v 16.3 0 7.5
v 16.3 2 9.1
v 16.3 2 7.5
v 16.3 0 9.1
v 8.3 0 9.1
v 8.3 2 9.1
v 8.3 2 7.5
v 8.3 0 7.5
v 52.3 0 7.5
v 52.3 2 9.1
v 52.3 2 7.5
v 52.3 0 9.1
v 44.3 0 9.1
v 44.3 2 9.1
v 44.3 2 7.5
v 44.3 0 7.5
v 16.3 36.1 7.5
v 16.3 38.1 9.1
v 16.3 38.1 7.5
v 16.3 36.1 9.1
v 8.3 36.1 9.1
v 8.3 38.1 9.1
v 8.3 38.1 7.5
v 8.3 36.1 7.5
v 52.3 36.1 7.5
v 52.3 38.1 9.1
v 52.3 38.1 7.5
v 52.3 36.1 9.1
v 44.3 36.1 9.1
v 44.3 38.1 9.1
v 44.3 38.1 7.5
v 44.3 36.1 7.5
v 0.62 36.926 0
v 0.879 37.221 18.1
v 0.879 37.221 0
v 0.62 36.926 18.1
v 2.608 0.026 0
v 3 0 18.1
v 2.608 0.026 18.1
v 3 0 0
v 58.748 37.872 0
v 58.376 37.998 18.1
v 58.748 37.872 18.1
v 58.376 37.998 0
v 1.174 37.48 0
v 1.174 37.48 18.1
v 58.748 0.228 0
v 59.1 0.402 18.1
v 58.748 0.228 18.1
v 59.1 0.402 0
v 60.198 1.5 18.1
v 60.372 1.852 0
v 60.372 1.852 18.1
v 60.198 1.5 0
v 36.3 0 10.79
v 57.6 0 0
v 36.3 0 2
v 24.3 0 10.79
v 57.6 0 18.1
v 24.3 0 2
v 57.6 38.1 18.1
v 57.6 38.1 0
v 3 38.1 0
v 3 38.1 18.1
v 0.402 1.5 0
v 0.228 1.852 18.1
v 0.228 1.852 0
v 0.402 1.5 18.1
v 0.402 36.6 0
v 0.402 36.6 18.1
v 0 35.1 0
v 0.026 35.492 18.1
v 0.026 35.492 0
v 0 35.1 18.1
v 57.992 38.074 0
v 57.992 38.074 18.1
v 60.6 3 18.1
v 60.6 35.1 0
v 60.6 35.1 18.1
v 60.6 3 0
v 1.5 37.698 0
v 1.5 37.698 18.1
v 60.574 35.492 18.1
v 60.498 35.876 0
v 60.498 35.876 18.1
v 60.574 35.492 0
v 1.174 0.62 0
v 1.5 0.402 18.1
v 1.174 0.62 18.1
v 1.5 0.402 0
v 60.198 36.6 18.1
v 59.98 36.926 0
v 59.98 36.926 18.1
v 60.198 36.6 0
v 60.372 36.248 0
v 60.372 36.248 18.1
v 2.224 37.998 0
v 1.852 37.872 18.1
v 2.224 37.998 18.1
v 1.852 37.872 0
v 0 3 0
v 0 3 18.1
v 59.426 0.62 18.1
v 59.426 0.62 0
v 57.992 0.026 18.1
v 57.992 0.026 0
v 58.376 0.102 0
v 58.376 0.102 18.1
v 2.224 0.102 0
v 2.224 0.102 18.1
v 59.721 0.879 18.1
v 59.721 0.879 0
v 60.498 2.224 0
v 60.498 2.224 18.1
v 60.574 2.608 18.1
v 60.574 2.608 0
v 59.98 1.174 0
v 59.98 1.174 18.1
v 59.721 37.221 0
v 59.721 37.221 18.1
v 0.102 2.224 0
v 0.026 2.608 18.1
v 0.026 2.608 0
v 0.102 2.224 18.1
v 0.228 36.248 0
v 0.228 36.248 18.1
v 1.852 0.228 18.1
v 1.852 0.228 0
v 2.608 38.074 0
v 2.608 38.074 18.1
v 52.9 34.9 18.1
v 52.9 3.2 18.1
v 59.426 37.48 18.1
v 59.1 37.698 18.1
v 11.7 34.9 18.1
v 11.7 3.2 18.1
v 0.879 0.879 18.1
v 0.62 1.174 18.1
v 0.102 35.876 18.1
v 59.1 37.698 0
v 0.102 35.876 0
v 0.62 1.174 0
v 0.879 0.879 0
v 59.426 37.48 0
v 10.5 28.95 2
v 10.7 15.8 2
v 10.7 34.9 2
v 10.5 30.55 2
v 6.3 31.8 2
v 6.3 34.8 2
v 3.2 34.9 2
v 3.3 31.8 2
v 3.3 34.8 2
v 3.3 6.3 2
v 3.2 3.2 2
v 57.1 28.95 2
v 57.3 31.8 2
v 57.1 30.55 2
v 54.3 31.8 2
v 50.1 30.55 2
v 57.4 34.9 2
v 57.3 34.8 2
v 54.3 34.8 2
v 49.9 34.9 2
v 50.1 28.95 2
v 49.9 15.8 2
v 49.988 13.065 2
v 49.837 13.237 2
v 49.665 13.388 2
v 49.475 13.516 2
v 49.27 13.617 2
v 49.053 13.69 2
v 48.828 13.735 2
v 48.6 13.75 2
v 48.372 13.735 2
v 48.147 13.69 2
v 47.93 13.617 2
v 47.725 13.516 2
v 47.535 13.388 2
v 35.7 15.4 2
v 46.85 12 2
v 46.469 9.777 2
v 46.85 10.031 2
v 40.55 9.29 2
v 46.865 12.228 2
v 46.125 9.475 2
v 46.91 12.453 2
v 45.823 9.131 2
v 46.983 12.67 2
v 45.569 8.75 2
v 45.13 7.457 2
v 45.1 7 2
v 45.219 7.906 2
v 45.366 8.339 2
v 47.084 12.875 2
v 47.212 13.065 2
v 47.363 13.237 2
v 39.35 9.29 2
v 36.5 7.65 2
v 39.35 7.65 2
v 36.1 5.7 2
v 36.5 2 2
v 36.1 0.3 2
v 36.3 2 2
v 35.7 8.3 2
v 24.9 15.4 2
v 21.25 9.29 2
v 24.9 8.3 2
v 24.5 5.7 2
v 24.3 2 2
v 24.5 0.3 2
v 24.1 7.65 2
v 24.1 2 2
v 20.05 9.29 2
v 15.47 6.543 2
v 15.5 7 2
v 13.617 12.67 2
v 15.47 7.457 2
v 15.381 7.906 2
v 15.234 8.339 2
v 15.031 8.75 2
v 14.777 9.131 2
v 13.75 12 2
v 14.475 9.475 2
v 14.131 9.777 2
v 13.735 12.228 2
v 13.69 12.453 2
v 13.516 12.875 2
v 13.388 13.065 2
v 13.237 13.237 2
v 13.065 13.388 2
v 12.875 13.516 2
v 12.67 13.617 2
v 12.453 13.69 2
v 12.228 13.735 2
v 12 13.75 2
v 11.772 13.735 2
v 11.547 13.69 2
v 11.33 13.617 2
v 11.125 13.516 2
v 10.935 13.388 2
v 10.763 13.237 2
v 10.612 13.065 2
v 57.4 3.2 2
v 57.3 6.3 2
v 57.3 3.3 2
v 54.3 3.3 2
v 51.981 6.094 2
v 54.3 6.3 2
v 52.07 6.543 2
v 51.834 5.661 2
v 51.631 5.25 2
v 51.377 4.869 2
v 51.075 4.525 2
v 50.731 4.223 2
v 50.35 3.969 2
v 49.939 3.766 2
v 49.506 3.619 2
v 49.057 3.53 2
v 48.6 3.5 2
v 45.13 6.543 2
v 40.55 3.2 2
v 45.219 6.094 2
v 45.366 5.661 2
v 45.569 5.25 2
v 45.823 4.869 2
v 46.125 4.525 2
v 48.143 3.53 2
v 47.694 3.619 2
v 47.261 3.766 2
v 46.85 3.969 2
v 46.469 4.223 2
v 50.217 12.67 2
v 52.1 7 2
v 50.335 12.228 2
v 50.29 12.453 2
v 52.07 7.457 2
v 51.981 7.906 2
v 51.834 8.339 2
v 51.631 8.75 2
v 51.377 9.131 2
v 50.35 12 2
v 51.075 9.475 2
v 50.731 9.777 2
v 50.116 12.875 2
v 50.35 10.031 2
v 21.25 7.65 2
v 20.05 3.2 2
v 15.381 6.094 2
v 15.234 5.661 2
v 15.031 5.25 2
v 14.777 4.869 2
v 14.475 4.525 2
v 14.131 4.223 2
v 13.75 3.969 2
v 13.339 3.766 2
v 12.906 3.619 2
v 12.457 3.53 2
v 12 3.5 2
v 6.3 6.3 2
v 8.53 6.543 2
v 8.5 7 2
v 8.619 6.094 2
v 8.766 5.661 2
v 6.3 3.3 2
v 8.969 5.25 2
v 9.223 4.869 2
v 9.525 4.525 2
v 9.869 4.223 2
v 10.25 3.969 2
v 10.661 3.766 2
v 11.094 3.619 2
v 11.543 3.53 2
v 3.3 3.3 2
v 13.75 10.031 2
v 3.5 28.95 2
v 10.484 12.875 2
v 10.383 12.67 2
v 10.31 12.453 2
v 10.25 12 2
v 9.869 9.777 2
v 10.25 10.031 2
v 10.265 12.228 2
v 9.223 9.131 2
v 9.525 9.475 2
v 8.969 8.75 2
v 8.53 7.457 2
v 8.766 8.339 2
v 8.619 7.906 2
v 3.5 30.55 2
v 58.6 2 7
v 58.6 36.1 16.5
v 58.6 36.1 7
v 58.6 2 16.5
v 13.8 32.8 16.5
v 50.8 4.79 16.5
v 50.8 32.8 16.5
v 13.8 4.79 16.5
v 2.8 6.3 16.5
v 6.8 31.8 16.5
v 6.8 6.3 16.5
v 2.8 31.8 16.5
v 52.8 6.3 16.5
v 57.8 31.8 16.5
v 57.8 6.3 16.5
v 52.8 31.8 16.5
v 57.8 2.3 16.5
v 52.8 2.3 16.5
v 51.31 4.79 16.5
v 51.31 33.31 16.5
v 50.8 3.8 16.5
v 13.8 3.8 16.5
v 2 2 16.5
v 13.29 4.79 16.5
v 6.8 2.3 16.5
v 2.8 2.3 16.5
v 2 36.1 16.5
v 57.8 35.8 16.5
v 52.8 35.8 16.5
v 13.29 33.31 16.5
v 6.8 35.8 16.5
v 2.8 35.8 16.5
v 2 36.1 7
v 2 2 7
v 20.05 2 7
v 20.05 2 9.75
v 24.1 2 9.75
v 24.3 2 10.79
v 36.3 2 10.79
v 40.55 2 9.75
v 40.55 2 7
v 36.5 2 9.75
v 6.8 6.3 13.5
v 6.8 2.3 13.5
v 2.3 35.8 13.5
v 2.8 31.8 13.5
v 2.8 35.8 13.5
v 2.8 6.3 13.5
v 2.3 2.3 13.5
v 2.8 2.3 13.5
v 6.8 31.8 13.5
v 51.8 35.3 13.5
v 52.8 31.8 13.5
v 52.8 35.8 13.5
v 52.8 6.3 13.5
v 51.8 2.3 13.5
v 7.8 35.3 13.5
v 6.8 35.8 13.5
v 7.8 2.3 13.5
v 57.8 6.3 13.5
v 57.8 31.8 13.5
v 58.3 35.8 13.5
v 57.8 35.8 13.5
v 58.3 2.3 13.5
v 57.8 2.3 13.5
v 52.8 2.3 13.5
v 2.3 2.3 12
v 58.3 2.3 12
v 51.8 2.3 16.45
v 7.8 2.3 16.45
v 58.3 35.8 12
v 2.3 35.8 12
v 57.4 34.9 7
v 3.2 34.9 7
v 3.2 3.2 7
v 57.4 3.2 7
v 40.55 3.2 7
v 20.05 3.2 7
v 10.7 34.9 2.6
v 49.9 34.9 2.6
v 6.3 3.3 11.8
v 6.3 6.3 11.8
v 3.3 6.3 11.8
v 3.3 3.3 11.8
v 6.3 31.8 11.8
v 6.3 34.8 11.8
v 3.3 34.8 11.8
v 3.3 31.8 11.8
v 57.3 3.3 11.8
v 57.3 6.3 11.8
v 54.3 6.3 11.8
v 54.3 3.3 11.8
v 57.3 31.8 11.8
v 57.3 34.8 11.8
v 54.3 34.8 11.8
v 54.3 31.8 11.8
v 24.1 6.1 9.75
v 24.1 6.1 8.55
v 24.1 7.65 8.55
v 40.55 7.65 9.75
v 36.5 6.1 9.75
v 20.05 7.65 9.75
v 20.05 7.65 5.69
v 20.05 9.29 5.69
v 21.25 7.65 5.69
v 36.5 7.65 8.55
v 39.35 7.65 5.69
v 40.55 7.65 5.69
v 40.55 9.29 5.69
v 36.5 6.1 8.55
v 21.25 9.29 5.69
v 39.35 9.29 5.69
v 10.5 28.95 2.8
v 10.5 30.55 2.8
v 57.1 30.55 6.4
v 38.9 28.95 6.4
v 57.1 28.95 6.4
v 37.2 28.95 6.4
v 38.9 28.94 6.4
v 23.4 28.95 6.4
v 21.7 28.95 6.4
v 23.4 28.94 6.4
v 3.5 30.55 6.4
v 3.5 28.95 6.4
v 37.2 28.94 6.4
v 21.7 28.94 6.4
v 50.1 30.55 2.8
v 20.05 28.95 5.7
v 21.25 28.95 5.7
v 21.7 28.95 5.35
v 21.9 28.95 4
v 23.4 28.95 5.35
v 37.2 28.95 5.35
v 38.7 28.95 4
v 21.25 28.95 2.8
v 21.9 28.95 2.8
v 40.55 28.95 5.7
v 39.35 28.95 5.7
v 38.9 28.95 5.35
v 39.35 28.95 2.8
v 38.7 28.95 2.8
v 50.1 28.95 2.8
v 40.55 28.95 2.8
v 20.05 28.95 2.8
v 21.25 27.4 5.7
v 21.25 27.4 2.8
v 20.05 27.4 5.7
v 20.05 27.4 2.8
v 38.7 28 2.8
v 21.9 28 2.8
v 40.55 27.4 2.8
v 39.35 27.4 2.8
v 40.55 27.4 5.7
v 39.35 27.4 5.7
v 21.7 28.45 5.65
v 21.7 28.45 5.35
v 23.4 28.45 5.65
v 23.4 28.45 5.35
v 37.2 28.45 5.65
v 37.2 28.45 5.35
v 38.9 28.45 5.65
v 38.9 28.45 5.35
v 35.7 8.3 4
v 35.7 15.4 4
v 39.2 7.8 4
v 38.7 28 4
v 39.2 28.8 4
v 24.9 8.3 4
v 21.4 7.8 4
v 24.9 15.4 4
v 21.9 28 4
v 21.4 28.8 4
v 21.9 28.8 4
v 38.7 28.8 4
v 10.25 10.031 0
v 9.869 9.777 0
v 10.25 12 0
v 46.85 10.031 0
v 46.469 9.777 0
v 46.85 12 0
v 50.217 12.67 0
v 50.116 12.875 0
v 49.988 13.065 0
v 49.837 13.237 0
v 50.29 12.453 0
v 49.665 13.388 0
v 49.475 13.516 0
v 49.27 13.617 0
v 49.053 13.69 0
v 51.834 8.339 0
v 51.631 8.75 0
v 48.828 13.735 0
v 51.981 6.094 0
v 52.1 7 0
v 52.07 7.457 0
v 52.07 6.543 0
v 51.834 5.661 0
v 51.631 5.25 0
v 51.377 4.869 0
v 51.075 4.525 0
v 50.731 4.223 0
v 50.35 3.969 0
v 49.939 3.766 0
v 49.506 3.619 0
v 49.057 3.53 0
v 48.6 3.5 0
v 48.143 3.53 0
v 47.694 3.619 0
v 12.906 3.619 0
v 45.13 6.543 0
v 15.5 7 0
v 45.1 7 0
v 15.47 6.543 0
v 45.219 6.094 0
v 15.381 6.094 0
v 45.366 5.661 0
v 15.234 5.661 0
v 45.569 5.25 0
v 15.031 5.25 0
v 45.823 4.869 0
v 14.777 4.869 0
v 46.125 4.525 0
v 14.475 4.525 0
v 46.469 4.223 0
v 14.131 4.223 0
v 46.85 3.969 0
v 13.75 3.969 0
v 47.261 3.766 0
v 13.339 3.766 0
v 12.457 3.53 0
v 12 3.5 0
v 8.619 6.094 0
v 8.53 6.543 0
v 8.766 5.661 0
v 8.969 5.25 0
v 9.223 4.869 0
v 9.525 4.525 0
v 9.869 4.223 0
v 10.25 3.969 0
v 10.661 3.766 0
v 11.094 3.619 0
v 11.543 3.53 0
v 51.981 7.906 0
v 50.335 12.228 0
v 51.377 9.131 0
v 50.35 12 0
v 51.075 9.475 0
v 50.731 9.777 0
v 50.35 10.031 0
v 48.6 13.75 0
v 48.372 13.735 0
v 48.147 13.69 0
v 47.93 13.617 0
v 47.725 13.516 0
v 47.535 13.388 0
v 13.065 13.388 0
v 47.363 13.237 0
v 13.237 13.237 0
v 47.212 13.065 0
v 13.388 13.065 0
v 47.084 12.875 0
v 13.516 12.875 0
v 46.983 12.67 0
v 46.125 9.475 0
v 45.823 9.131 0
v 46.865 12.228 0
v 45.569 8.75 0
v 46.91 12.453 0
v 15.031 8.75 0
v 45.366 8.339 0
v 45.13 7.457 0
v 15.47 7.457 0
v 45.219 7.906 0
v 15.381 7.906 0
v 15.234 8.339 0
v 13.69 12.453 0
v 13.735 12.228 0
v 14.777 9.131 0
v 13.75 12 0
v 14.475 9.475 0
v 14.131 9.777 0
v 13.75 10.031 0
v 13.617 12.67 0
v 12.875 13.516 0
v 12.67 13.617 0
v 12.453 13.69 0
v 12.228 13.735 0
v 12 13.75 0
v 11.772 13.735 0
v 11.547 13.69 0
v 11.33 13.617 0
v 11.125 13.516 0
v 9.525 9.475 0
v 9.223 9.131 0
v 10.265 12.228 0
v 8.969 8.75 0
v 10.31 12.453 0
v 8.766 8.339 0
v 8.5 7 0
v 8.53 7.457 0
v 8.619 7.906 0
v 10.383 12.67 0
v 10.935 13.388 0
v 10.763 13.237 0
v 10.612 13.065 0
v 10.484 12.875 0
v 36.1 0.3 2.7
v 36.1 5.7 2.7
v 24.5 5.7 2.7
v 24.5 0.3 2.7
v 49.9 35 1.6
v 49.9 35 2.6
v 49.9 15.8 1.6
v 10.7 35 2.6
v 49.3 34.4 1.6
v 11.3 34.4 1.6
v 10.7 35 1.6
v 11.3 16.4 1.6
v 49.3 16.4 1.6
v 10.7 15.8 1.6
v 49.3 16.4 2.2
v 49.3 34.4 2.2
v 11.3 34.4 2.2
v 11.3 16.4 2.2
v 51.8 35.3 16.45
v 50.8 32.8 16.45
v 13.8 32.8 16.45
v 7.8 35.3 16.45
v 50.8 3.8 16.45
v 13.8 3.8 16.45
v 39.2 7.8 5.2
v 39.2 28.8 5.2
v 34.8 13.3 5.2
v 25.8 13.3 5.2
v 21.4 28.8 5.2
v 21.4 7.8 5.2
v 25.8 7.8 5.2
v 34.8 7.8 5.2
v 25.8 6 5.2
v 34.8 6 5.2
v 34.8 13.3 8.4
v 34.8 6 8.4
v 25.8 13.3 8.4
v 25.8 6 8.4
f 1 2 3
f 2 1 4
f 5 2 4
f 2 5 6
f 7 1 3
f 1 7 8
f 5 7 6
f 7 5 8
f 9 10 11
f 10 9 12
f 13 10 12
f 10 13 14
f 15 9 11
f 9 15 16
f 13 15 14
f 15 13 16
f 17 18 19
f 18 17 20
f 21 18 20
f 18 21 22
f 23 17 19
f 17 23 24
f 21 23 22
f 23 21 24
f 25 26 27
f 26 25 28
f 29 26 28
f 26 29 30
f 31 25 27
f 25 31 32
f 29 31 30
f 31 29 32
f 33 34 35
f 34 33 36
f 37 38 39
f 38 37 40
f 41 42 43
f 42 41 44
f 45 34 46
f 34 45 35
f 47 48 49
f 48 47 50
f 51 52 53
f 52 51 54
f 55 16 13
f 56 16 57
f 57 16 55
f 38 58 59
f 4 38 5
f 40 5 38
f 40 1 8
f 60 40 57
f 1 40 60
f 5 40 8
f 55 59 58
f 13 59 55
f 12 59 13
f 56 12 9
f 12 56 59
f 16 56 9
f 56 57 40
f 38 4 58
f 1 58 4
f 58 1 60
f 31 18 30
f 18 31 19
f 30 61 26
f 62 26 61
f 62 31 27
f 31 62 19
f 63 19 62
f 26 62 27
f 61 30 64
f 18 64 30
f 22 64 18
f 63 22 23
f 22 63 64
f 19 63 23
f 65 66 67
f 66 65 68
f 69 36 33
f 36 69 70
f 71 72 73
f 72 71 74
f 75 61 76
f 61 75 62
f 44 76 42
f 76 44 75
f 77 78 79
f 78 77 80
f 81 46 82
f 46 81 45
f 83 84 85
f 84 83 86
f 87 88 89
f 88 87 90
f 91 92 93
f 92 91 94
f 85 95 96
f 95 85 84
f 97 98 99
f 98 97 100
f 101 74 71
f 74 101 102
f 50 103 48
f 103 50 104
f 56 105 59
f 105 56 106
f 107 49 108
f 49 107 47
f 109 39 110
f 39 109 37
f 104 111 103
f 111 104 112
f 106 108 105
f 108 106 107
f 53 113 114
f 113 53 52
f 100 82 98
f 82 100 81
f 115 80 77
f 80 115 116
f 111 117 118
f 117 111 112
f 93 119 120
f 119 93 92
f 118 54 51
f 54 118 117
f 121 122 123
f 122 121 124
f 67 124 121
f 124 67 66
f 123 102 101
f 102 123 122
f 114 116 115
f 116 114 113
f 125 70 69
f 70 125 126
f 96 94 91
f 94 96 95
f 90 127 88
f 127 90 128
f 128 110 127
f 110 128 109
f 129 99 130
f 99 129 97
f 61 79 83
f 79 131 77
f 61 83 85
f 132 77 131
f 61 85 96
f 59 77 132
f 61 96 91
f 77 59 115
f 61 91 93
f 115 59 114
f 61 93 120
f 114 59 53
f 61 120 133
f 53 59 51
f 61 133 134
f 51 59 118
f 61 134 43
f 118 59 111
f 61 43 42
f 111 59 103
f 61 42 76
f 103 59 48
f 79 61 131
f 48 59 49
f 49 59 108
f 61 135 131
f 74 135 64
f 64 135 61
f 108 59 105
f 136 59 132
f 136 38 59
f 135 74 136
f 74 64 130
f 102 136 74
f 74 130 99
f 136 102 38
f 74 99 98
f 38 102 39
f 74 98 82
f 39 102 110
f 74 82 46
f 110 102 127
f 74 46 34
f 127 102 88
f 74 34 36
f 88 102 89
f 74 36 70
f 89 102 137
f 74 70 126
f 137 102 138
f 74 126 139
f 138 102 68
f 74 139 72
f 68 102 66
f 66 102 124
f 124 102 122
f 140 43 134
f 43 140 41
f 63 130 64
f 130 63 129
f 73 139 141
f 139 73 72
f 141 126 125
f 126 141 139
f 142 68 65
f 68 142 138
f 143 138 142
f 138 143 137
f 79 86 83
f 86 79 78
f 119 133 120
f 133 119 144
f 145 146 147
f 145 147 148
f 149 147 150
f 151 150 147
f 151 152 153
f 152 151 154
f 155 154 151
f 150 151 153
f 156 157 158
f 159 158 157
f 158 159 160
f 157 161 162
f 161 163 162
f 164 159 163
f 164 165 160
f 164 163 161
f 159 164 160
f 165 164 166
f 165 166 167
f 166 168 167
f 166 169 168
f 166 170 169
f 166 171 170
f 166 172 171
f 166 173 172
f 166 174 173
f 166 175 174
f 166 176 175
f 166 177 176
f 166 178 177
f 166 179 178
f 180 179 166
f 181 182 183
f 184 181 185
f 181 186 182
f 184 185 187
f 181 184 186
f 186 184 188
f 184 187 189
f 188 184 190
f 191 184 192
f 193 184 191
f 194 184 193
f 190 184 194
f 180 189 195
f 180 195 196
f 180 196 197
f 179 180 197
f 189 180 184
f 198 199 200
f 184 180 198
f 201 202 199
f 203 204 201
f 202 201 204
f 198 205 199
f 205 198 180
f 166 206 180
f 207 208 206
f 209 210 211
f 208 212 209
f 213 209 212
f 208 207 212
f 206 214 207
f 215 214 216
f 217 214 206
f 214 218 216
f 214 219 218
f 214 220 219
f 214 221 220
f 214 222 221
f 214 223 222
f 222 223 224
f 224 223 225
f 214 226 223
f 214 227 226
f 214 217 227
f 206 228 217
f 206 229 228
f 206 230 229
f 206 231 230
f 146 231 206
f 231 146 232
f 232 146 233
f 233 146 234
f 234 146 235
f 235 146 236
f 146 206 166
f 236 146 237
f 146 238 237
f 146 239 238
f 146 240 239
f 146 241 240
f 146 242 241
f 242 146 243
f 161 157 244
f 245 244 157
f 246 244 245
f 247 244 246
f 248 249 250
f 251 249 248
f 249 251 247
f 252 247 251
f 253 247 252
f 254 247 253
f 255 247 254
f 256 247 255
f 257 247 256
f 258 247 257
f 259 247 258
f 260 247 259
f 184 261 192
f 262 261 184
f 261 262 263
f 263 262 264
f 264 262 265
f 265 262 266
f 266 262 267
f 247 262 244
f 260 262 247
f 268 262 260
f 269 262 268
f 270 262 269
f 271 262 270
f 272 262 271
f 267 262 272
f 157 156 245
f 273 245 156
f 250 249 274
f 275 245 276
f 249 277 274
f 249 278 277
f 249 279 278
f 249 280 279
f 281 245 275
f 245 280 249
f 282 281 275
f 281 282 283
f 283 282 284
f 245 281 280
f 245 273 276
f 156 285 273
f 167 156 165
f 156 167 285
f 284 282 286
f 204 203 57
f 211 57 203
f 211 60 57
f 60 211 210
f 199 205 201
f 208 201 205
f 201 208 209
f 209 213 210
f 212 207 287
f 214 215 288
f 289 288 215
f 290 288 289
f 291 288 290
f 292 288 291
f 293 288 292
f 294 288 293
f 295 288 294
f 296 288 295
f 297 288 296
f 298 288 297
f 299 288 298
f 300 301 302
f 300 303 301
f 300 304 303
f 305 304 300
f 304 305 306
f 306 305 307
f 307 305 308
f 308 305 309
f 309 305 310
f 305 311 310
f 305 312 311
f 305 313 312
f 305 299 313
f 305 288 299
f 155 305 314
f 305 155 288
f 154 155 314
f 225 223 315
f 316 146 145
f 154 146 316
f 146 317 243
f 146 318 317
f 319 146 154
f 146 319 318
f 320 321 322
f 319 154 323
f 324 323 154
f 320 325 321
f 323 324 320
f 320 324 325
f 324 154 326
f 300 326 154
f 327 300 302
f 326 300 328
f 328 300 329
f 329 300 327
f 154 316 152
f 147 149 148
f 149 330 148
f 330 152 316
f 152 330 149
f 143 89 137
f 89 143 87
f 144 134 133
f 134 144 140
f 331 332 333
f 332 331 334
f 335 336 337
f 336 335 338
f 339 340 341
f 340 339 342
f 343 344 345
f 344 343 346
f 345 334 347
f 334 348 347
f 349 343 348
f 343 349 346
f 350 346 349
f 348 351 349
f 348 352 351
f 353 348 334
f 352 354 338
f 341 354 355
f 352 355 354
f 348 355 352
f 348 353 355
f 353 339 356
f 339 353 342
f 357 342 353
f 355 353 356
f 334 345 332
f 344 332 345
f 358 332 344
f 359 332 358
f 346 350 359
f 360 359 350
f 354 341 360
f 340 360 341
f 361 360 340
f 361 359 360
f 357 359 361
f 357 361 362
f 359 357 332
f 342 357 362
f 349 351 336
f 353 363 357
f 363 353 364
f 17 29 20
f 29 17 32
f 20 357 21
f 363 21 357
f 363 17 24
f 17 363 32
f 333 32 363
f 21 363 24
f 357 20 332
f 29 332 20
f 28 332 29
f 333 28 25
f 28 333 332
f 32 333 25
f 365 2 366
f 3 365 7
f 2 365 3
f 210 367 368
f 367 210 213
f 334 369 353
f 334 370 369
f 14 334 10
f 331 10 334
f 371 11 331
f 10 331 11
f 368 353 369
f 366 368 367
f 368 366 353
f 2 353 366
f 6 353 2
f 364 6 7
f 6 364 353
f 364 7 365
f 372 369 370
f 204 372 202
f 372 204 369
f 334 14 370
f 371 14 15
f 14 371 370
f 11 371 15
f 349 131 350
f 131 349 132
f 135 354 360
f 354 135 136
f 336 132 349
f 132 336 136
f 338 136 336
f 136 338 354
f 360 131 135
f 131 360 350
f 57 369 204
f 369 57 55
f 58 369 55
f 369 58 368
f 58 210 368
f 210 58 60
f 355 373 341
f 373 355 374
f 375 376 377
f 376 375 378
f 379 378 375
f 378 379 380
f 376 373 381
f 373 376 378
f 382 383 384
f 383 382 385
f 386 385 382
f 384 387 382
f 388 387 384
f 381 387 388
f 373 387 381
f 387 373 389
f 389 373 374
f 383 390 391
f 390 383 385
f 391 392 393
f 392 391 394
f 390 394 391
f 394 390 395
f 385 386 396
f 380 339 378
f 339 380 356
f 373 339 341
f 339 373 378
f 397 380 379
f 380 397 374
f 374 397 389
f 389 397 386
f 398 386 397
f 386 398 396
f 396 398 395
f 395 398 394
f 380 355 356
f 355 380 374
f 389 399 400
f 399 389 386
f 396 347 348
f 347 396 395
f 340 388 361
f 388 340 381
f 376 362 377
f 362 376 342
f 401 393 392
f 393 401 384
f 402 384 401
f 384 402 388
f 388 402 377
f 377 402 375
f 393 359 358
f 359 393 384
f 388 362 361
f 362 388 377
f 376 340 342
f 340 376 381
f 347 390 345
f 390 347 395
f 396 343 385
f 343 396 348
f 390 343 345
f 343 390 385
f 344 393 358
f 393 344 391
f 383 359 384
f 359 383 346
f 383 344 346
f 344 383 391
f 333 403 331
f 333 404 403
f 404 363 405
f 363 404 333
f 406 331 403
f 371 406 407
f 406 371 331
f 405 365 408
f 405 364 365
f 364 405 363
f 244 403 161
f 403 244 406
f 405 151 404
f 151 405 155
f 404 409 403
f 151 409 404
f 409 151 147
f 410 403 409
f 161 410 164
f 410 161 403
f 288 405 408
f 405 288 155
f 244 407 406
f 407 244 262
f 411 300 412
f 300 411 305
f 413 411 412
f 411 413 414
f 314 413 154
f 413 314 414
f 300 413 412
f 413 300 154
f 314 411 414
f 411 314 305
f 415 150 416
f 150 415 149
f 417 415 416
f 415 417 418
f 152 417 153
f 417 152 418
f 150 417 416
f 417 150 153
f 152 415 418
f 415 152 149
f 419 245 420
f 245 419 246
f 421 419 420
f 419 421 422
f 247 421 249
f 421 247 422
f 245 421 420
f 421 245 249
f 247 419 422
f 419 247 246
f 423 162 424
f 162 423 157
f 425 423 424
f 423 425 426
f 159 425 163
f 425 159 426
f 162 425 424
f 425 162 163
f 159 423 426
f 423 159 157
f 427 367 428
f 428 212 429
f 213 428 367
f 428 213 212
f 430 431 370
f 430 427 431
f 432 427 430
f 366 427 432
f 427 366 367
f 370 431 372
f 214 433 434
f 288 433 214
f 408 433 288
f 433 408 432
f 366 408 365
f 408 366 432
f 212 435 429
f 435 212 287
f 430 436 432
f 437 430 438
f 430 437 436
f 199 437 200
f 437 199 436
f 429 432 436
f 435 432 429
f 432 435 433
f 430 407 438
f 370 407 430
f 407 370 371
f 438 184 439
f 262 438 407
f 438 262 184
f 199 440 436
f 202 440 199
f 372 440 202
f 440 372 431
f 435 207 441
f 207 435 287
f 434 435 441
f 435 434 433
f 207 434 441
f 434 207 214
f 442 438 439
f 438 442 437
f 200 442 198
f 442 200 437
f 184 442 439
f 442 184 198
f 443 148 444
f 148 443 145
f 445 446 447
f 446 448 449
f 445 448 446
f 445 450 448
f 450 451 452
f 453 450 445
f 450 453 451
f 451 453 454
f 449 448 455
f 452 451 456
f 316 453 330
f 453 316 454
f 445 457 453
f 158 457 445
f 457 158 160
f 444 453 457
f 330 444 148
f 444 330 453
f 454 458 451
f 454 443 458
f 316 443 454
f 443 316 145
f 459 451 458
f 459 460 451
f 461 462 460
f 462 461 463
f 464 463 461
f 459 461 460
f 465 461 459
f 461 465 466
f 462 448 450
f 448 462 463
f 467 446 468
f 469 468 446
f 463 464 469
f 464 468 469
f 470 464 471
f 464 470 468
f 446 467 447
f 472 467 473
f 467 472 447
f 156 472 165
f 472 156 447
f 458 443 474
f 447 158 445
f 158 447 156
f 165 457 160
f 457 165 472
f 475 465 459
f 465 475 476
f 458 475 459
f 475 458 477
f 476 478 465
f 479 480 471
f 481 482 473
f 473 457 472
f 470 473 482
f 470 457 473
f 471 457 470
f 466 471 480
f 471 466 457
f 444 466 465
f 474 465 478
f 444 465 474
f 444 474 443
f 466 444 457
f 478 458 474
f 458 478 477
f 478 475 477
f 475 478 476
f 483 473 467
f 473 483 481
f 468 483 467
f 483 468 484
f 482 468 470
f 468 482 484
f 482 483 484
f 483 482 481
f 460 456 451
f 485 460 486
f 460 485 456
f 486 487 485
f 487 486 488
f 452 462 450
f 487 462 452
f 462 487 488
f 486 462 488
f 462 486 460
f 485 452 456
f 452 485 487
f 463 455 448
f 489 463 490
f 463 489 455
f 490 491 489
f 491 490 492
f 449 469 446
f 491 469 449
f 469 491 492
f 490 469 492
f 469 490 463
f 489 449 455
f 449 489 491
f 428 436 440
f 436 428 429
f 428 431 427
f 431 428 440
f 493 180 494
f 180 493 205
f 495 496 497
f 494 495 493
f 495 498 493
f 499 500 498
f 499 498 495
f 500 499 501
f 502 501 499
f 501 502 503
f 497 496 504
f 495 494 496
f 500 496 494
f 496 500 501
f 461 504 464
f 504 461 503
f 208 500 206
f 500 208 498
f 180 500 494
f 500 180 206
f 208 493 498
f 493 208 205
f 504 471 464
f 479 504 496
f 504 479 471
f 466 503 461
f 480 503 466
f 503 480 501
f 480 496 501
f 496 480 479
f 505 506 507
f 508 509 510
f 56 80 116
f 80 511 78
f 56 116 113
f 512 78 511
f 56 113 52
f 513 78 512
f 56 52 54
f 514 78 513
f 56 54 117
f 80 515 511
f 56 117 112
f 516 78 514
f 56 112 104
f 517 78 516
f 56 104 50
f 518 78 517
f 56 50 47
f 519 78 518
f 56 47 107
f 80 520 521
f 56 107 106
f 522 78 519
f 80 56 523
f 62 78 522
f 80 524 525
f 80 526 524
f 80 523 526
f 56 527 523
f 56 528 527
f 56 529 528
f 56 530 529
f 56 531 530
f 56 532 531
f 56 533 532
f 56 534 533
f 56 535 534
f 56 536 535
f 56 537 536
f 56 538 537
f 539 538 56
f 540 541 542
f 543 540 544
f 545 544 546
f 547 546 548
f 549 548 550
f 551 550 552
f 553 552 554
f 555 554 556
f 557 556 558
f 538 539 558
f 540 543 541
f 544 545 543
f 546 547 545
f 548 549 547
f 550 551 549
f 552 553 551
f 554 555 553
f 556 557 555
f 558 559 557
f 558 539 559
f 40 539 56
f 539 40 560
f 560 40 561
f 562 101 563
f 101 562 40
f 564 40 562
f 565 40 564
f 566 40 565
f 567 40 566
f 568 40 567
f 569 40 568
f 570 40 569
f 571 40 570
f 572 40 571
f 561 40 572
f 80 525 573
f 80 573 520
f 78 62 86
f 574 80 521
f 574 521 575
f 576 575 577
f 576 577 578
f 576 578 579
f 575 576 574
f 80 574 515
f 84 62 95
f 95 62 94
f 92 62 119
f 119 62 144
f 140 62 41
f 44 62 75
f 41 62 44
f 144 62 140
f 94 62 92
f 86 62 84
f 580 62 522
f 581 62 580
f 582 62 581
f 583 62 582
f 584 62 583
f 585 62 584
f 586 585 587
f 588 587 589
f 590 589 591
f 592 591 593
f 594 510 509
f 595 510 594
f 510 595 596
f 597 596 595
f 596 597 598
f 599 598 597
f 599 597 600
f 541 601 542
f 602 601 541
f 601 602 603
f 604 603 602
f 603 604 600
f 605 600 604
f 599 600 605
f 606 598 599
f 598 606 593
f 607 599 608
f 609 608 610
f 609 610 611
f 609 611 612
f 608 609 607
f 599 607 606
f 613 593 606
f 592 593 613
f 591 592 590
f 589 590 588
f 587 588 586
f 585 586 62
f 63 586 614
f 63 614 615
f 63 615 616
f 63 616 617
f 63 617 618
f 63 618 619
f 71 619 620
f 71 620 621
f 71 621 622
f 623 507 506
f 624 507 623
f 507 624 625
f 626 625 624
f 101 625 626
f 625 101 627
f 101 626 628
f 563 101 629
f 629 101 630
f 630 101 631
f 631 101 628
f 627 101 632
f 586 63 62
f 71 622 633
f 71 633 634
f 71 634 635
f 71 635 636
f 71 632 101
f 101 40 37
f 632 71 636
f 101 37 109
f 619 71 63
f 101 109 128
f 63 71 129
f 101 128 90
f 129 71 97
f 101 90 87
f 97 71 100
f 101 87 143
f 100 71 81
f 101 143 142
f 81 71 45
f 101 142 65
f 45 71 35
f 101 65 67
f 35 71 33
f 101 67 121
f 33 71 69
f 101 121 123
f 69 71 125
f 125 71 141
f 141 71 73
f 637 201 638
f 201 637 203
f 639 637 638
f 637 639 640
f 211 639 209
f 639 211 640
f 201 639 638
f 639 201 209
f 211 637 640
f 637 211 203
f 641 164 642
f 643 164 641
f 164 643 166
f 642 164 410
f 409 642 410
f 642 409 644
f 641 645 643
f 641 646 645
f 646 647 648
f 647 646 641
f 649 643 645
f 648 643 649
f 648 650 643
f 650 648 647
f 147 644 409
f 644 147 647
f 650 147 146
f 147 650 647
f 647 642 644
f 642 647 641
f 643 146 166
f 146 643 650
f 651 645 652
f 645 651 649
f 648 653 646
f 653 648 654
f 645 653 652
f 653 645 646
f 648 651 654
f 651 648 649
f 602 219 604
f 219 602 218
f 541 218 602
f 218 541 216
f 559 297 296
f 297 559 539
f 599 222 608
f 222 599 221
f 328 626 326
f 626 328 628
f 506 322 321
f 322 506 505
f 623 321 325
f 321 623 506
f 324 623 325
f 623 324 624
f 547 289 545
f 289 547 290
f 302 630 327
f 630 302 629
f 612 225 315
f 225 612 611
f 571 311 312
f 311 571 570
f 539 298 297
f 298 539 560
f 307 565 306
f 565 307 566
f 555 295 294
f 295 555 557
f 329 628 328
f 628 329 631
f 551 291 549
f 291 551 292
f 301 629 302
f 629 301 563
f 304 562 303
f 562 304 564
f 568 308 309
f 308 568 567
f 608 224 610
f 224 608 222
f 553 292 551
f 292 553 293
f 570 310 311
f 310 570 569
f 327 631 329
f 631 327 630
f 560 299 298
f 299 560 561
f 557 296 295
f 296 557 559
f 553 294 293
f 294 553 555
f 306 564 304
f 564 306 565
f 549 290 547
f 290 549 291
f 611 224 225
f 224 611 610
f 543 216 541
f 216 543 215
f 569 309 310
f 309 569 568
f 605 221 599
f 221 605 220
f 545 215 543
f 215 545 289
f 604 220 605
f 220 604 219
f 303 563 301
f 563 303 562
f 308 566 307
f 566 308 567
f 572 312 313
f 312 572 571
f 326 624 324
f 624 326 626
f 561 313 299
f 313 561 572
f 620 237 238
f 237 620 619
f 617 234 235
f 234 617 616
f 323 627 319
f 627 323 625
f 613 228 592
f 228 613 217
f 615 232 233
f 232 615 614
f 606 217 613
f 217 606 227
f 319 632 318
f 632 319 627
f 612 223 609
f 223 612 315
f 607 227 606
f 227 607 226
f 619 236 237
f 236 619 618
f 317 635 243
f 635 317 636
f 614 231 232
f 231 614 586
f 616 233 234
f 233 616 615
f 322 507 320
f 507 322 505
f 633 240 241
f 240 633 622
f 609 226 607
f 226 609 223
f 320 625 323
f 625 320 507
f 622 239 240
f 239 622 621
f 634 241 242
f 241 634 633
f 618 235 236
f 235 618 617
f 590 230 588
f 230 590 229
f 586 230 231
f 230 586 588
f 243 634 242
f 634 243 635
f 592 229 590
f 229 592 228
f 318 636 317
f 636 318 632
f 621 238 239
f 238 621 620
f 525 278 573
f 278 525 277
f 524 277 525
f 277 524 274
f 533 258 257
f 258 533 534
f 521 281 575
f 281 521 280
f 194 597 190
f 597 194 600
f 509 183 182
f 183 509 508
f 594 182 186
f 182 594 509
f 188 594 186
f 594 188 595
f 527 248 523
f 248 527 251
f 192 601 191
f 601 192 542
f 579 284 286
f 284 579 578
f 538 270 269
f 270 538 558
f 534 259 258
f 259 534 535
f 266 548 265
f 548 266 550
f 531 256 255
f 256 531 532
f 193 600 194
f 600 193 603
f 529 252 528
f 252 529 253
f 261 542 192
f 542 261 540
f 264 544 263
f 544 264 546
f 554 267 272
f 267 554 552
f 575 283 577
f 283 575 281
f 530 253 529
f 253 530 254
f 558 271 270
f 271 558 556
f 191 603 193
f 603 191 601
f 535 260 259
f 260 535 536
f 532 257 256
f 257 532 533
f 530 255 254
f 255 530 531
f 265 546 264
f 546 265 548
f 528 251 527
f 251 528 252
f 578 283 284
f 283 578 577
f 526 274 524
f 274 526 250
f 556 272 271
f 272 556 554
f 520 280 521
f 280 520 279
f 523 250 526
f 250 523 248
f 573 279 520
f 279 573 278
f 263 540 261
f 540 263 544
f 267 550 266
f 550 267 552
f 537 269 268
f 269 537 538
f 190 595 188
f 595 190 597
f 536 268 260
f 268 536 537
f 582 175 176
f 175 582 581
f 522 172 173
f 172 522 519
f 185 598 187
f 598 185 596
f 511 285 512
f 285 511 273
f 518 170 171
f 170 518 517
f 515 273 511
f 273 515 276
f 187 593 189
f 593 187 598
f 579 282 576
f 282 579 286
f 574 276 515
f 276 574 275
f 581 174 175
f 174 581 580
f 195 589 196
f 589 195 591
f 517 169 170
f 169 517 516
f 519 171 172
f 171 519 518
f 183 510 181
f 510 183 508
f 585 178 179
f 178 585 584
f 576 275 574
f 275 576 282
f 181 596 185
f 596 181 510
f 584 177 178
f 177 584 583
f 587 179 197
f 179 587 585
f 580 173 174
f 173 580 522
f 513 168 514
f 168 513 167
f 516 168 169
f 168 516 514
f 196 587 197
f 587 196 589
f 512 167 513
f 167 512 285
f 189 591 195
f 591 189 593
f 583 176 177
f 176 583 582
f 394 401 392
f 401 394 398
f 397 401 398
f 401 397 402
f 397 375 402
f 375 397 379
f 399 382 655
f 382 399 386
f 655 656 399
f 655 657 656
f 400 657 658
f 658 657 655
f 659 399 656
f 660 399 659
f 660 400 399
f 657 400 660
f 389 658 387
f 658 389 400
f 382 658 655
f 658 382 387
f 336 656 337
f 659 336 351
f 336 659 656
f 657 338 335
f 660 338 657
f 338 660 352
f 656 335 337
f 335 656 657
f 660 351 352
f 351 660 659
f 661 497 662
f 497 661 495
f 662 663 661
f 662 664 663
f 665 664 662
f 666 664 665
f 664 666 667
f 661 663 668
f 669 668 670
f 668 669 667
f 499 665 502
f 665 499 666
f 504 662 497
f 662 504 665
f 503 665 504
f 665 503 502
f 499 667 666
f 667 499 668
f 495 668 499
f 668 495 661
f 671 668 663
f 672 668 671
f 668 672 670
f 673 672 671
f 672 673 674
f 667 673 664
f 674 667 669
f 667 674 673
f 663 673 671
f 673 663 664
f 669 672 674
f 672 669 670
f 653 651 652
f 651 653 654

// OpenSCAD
// =====================================================================
//  PV display – wall enclosure for 1.8" TFT (ST7735) + Seeed XIAO ESP32-S3
//  All dimensions in mm. Values marked  // MEASURE  are still estimates.
//
//  Printed parts:
//    teil = "front"      -> frame with display window (print front face down)
//    teil = "testblende" -> front plate only, quick test print for window and fit
//    teil = "deckel"     -> back lid with XIAO holder, antenna outline and keyholes (print flat)
//    teil = "halter_test"-> lower part of the lid with the XIAO holder only: quick test print
//    teil = "deckel_test"-> outer edge of the lid only (rim + crush ribs): quick fit test
//    teil = "alles" / "explodiert" -> assembly / exploded view (preview only, do not print)
//  Export: set teil, F6 (render), F7 (save STL)
// =====================================================================

teil = "alles";              // [alles, explodiert, front, deckel, testblende, halter_test, deckel_test]

/* [Display module] */
pcb_b        = 56.0;         // PCB width
pcb_h        = 33.5;         // PCB height (+0.5 after test print)
pcb_d        = 1.5;          // PCB thickness
glas_ab_links  = 5.5;        // free PCB area left of the glass (header pins are here)
glas_ab_rechts = 6.5;        // free PCB area right of the glass
glas_b       = pcb_b - glas_ab_links - glas_ab_rechts;   // = 44 mm
glas_h       = 33.0;         // glass height (same as PCB)
glas_d       = 3.0;          // glass thickness (total 4.5 minus PCB 1.5)
aktiv_b      = 37.0;         // active area width (after test print: 5 mm narrower on the left, right unchanged)
aktiv_h      = 29.0;         // active area height
aktiv_ab_links = 11.5;       // active area: distance from the left PCB edge (after test print)
aktiv_ab_oben  = 3.0;        // active area: distance from the top PCB edge

/* [XIAO ESP32-S3] */
// The XIAO clicks into a holder on the lid, component side towards the display, USB-C pointing down.
// Hook it in with the USB end first (socket under the bridge), then press the far end down until
// it snaps behind the two lips. To remove: push the rear bar outwards and lift the far end.
// Plugging in pushes the board against the rear bar, pulling the cable pulls it against the
// posts beside the socket - the snap lips only keep it from lifting.
xiao_b       = 17.8;         // PCB width
xiao_l       = 21.0;         // PCB length (without the USB socket)
xiao_pcb     = 1.2;          // PCB thickness                                              // MEASURE
xiao_unten_frei = 2.0;       // free space under the PCB (solder joints on the bottom side)  // MEASURE
usb_b        = 9.0;          // USB-C socket width
usb_h        = 3.2;          // USB-C socket height above the PCB                           // MEASURE
usb_ueberstand = 1.8;        // USB-C socket protrudes beyond the PCB edge
raste_ueberstand = 0.5;      // snap lip overlap on the PCB (larger = holds tighter, harder to snap)
steg_d       = 1.6;          // thickness of the flexible rear bar (thinner = softer snap)
halter_spiel = 0.15;         // clearance around the XIAO in the holder
xiao_nach_innen = 4.0;       // XIAO this far away from the USB wall (the plug then reaches into the enclosure)

/* [Antenna] */
ant_b        = 38.0;         // adhesive antenna width
ant_h        = 18.0;         // adhesive antenna height

/* [USB cable] */
stecker_b    = 12.0;         // opening for the plug: width (with some clearance)
stecker_h    = 8.0;          // opening for the plug: height (with some clearance)

/* [Enclosure] */
wand         = 2.0;          // wall thickness
front        = 1.6;          // front bezel thickness
deckel_d     = 2.0;          // back lid thickness
spiel        = 0.3;          // clearance around the PCBs (print tolerance)
deckel_passung = 0.0;        // clearance between lid rim and enclosure (smaller = tighter; was 0.2, then 0.05)
rand_h       = 5.0;          // height of the lid rim (was 3; max. raum_hinten - 4.8, the vents start above)
klemm_rippe  = 0.3;          // crush ribs: how far they protrude beyond the rim (0 = none)
raum_hinten  = 10.0;         // space behind the display (XIAO, antenna, screw heads)
ecken_r      = 3.0;          // outer corner radius
fenster_rand = 0.5;          // window slightly larger than the active area
rahmen_ausgleich = "fenster"; // [fenster, gehaeuse, aus]  equal frame top/bottom: shorten window at the bottom, or extend enclosure at the bottom, or off
schraube_d   = 3.5;          // wall screw shank diameter
kopf_d       = 7.0;          // wall screw head diameter

$fn = 48;

// ---------------------------------------------------------------- derived dimensions
innen_b = pcb_b + 2*spiel;
innen_h = pcb_h + 2*spiel;
aussen_b = innen_b + 2*wand;
// The active area is not centered on the PCB (more margin at the top than at the bottom).
// "gehaeuse": the bottom wall gets the difference added (enclosure gets taller)
// "fenster":  the window is shortened at the bottom by the difference (enclosure unchanged)
versatz = max(0, aktiv_ab_oben - (pcb_h - aktiv_ab_oben - aktiv_h));
extra_unten = rahmen_ausgleich == "gehaeuse" ? versatz : 0;
wand_u = wand + extra_unten;                         // bottom wall thickness
aussen_h = innen_h + wand + wand_u;
rahmen_t = raum_hinten + pcb_d + glas_d + front;     // depth of the front part
pcb_x = wand + spiel;                                // PCB bottom-left corner (front view)
pcb_y = wand_u + spiel;
z_pcb  = raum_hinten;                                // PCB back side (in front part coordinates)
z_glas = raum_hinten + pcb_d;                        // glass back side
z_blende = rahmen_t - front;                         // inner face of the front bezel
// XIAO in lid coordinates (lid plate z = 0 ... deckel_d)
xiao_x0 = aussen_b/2 - xiao_b/2;                     // centered, USB pointing down
xiao_y0 = wand_u + usb_ueberstand + xiao_nach_innen; // USB end of the PCB
usb_mund = xiao_y0 - usb_ueberstand;                 // socket mouth (the plug reaches in up to here)
xiao_y1 = xiao_y0 + xiao_l;                          // far end of the PCB
xiao_z0 = deckel_d + xiao_unten_frei;                // PCB bottom side
xiao_z1 = xiao_z0 + xiao_pcb;                        // PCB top side
usb_oben = xiao_z1 + usb_h;                          // top of the USB socket
usb_mitte = xiao_unten_frei + xiao_pcb + usb_h/2;    // USB socket center (front part coordinates)
ant_x = aussen_b/2 - ant_b/2;                        // antenna centered at the top of the lid
ant_y = aussen_h - wand - 0.2 - 1.2 - 0.3 - ant_h;   // just below the lid rim (partly under the XIAO)

echo(str("Gehäuse außen: ", aussen_b, " x ", aussen_h, " x ", rahmen_t + deckel_d, " mm"));
// window position (inner face of the bezel), possibly shortened at the bottom
fenster_x = pcb_x + aktiv_ab_links - fenster_rand;
fenster_b = aktiv_b + 2*fenster_rand;
fenster_y0 = pcb_y + (pcb_h - aktiv_ab_oben - aktiv_h) - fenster_rand;
fenster_h0 = aktiv_h + 2*fenster_rand;
kuerzung = rahmen_ausgleich == "fenster" ? versatz : 0;
fenster_y = fenster_y0 + kuerzung;
fenster_h = fenster_h0 - kuerzung;
echo(str("Rahmen vorne: oben ", aussen_h - (fenster_y + fenster_h + front),
         " mm, unten ", fenster_y - front, " mm, Fenster ", fenster_b, " x ", fenster_h, " mm"));
if (aktiv_ab_links < glas_ab_links || aktiv_ab_links + aktiv_b > pcb_b - glas_ab_rechts)
    echo("ACHTUNG: Bild liegt nicht vollständig auf dem Glas - Maße prüfen!");

// ---------------------------------------------------------------- helper shapes
module rund_rechteck(b, h, t, r) {          // box with rounded vertical edges
    hull() for (x = [r, b-r], y = [r, h-r]) translate([x, y, 0]) cylinder(r=r, h=t);
}

// ---------------------------------------------------------------- front part
module frontteil() {
    difference() {
        rund_rechteck(aussen_b, aussen_h, rahmen_t, ecken_r);

        // cavity (open at the back)
        translate([wand, wand_u, -0.01]) cube([innen_b, innen_h, z_blende + 0.01]);

        // display window, chamfered towards the front (45°) to avoid shading
        fx = fenster_x;  fy = fenster_y;  fb = fenster_b;  fh = fenster_h;
        hull() {
            translate([fx, fy, z_blende - 0.01]) cube([fb, fh, 0.01]);
            translate([fx - front, fy - front, rahmen_t]) cube([fb + 2*front, fh + 2*front, 0.01]);
        }

        // notch for the USB plug at the bottom (open towards the back)
        translate([aussen_b/2 - stecker_b/2, -0.01, -0.01])
            cube([stecker_b, wand_u + 0.02, usb_mitte + stecker_h/2]);

        // ventilation slots at top and bottom
        for (w = [[-0.01, wand_u], [aussen_h - wand - 0.01, wand]], i = [-1.5, 1.5])
            translate([aussen_b/2 + i*12 - 4, w[0], raum_hinten - 4.5]) cube([8, w[1] + 0.02, 1.6]);
    }

    // PCB supports left and right of the glass
    // (one rib at top and bottom each, the middle stays free for the header solder joints)
    for (seite = [[pcb_x, glas_ab_links], [pcb_x + pcb_b - glas_ab_rechts + 0.5, glas_ab_rechts]])
        if (seite[1] > 1.5)
            for (y = [pcb_y, pcb_y + pcb_h - 4])
                translate([seite[0] + 0.5, y, z_glas]) cube([seite[1] - 1.5, 4, glas_d]);
}

// ---------------------------------------------------------------- back lid
module schluesselloch() {
    cylinder(d=kopf_d, h=10, center=true);
    hull() for (dy = [0, 5]) translate([0, dy, 0]) cylinder(d=schraube_d, h=10, center=true);
}

// XIAO holder on the lid (lid coordinates)
module xiao_halter() {
    s  = halter_spiel;
    ox = xiao_x0 - s - 1.2;                   // outer x of the side guides
    ix = xiao_x0 + xiao_b + s;                // inner x of the right side guide
    // --- USB end: posts beside the plug (stop when pulling the cable) + bridge over the socket.
    // The posts leave a channel as wide as the wall notch, so the plug can reach in to the socket.
    py0 = wand_u + deckel_passung;            // starts at the inner wall
    py1 = xiao_y0 - s;                        // ends in front of the PCB edge
    buegel_z = usb_oben + s;
    kanal = max(stecker_b, usb_b + 0.6) / 2 + 0.2;   // half width of the channel for the plug
    for (seite = [[ox, aussen_b/2 - kanal - ox],                       // left
                  [aussen_b/2 + kanal, ix + 1.2 - (aussen_b/2 + kanal)]]) {  // right
        translate([seite[0], py0, deckel_d - 0.01]) cube([seite[1], py1 - py0, buegel_z + 1.2 - deckel_d + 0.01]);
    }
    // bridge over the socket, only over the part behind the socket mouth (the plug stays in front of it)
    translate([ox, max(py0, usb_mund + 0.1), buegel_z]) cube([ix + 1.2 - ox, py1 - max(py0, usb_mund + 0.1), 1.2]);
    // side guides at the USB end (corners have no pads)
    for (x = [ox, ix]) translate([x, py1 - 0.01, deckel_d - 0.01]) cube([1.2, 1.5 + s, xiao_z1 + 0.5 - deckel_d]);

    // --- pedestal under the middle of the PCB (stays clear of the solder joints and of the antenna)
    sockel_y1 = min(xiao_y1 - 1, ant_y - 1.0);
    translate([xiao_x0 + 3.5, xiao_y0 + 0.5, deckel_d - 0.01]) cube([xiao_b - 7, sockel_y1 - xiao_y0 - 0.5, xiao_unten_frei + 0.01]);

    // --- far end: flexible bar spanning over the antenna (stop when plugging in, carries the snap lips)
    by0 = xiao_y1 + s;
    by1 = by0 + steg_d;
    unten = deckel_d + 0.8;                   // bar bottom: above the antenna
    oben  = xiao_z1 + 1.2;
    fuss_x0 = wand + deckel_passung + 1.2 + 0.3;         // feet outside the antenna outline
    fuss_x1 = ant_x - 0.8;
    for (fx = [[fuss_x0, fuss_x1], [aussen_b - fuss_x1, aussen_b - fuss_x0]])
        translate([fx[0], by0, deckel_d - 0.01]) cube([fx[1] - fx[0], steg_d, oben - deckel_d + 0.01]);
    translate([fuss_x0, by0, unten]) cube([aussen_b - 2*fuss_x0, steg_d, oben - unten]);
    // ledge under the far edge of the PCB
    translate([xiao_x0 + 0.5, xiao_y1 - 0.8, unten]) cube([xiao_b - 1, 0.8 + s + 0.01, xiao_z0 - unten]);
    // side guides at the far end
    for (x = [ox, ix]) translate([x, xiao_y1 - 1.4, unten]) cube([1.2, 1.4 + s + 0.01, xiao_z1 + 0.5 - unten]);
    // snap lips at the two far corners (between the pads and the U.FL / camera connector),
    // chamfered on top so the PCB pushes the bar back when pressed in
    for (lx = [xiao_x0 + 0.3, xiao_x0 + xiao_b - 2.0])
        hull() {
            translate([lx, by0 - raste_ueberstand, xiao_z1 + s]) cube([1.7, raste_ueberstand + 0.01, 0.3]);
            translate([lx, by0 - 0.01, oben - 0.2]) cube([1.7, 0.02, 0.2]);
        }
}

module rueckdeckel() {
    rand = 1.2;                           // wall thickness of the lid rim
    passung = deckel_passung;             // clearance between rim and enclosure
    difference() {
        union() {
            rund_rechteck(aussen_b, aussen_h, deckel_d, ecken_r);

            // crush ribs on the outside of the rim: they deform slightly when the lid is pushed in,
            // so the fit no longer depends on the exact print tolerance
            rx0 = wand + passung;  rx1 = wand + passung + innen_b - 2*passung;
            ry0 = wand_u + passung; ry1 = wand_u + passung + innen_h - 2*passung;
            versatz_r = 0.6 - klemm_rippe;     // rib center inside the rim face (rib d = 1.2)
            for (p = [[aussen_b*0.25, ry0 + versatz_r], [aussen_b*0.75, ry0 + versatz_r],
                      [aussen_b*0.25, ry1 - versatz_r], [aussen_b*0.75, ry1 - versatz_r],
                      [rx0 + versatz_r, (ry0 + ry1)/2], [rx1 - versatz_r, (ry0 + ry1)/2]])
                if (klemm_rippe > 0) translate([p[0], p[1], deckel_d]) {
                    cylinder(d=1.2, h=rand_h - 1);
                    translate([0, 0, rand_h - 1]) cylinder(d1=1.2, d2=0.4, h=1);   // lead-in
                }

            // lid rim (holds the lid by friction)
            translate([0, 0, deckel_d]) difference() {
                translate([wand + passung, wand_u + passung, 0])
                    cube([innen_b - 2*passung, innen_h - 2*passung, rand_h]);
                translate([wand + passung + rand, wand_u + passung + rand, -0.01])
                    cube([innen_b - 2*passung - 2*rand, innen_h - 2*passung - 2*rand, rand_h + 0.02]);
                // cut-out for the USB plug
                translate([aussen_b/2 - stecker_b/2 - 1, 0, -0.01]) cube([stecker_b + 2, wand_u + rand + 1, rand_h + 0.02]);
            }

            // posts pressing the display against the front from behind
            for (x = [pcb_x + 1, pcb_x + pcb_b - 4], y = [pcb_y + 1, pcb_y + pcb_h - 4])
                translate([x, y, deckel_d]) cube([3, 3, raum_hinten - 0.2]);

            xiao_halter();

            // rest for the USB plug from the wall notch to the socket (the notch then fits the plug all around,
            // so sideways pull on the cable goes into the enclosure, not into the socket)
            auflage_h = usb_mitte - stecker_h/2 - 0.1;
            if (auflage_h > 0.3)
                translate([aussen_b/2 - stecker_b/2 + 0.2, 0.3, deckel_d - 0.01])
                    cube([stecker_b - 0.4, usb_mund - 0.3 - 0.3, auflage_h + 0.01]);
        }

        // engraved outline: stick the antenna here
        translate([0, 0, deckel_d - 0.4]) difference() {
            translate([ant_x - 0.6, ant_y - 0.6, 0]) cube([ant_b + 1.2, ant_h + 1.2, 1]);
            translate([ant_x, ant_y, -0.01]) cube([ant_b, ant_h, 1.1]);
        }

        // keyholes for wall mounting, bottom left and right
        // (place the enclosure over the screw heads and slide it down)
        for (x = [12, aussen_b - 12])
            translate([x, 7 + extra_unten, 0]) schluesselloch();
    }
}

// ---------------------------------------------------------------- output
module zusammenbau(abstand = 0) {
    color("SlateGray") translate([0, 0, deckel_d + abstand]) frontteil();
    color("DimGray") rueckdeckel();
    // placeholders for display, XIAO and antenna (preview only, not printed)
    color("DarkGreen") translate([pcb_x, pcb_y, deckel_d + abstand + z_pcb]) cube([pcb_b, pcb_h, pcb_d]);
    color("Black") translate([pcb_x + glas_ab_links, pcb_y, deckel_d + abstand + z_glas]) cube([glas_b, glas_h, glas_d - 0.05]);
    color("RoyalBlue") translate([pcb_x + aktiv_ab_links, pcb_y + pcb_h - aktiv_ab_oben - aktiv_h,
                                  deckel_d + abstand + z_glas + glas_d - 0.05]) cube([aktiv_b, aktiv_h, 0.05]);
    color("Purple") translate([xiao_x0, xiao_y0, xiao_z0]) cube([xiao_b, xiao_l, xiao_pcb]);       // XIAO on the lid
    color("Silver") translate([aussen_b/2 - usb_b/2, xiao_y0 - usb_ueberstand, xiao_z1])
        cube([usb_b, 7.3, usb_h]);                                                       // USB-C socket
    color("Goldenrod") translate([ant_x, ant_y, deckel_d]) cube([ant_b, ant_h, 0.2]);    // antenna
}

if (usb_oben + halter_spiel + 1.2 > deckel_d + raum_hinten - 0.5)
    echo("ACHTUNG: XIAO-Halter stößt an die Displayplatine - raum_hinten vergrößern!");
echo(str("XIAO-Platine: Unterseite ", xiao_z0 - deckel_d, " mm über dem Deckel, USB-Mitte ", usb_mitte, " mm"));

if (teil == "alles")       zusammenbau(0);
if (teil == "halter_test") // lower part of the lid with the holder: test fit and snap before printing the full lid
    intersection() {
        rueckdeckel();
        translate([-1, -1, -1]) cube([aussen_b + 2, xiao_y1 + halter_spiel + steg_d + 1.5 + 1, 30]);
    }
if (teil == "explodiert")  zusammenbau(25);
if (teil == "front")       translate([0, aussen_h, rahmen_t]) rotate([180, 0, 0]) frontteil();  // front face down
if (teil == "deckel")      rueckdeckel();
if (rand_h > raum_hinten - 4.8)
    echo("ACHTUNG: Deckelrand verdeckt die Lüftungsschlitze - rand_h verkleinern!");
if (teil == "deckel_test") // only the outer edge of the lid with rim and crush ribs: quick fit test
    intersection() {
        rueckdeckel();
        difference() {
            translate([-1, -1, -1]) cube([aussen_b + 2, aussen_h + 2, 30]);
            translate([wand + 3.5, wand_u + 3.5, -2]) cube([aussen_b - 2*wand - 7, aussen_h - wand - wand_u - 7, 40]);
        }
    }
if (teil == "testblende")  // front plate + 3 mm rim only: quick print to test-fit the display
    translate([0, aussen_h, rahmen_t]) rotate([180, 0, 0])
        intersection() {
            frontteil();
            translate([-1, -1, rahmen_t - front - 3]) cube([aussen_b + 2, aussen_h + 2, front + 3 + 1]);
        }
